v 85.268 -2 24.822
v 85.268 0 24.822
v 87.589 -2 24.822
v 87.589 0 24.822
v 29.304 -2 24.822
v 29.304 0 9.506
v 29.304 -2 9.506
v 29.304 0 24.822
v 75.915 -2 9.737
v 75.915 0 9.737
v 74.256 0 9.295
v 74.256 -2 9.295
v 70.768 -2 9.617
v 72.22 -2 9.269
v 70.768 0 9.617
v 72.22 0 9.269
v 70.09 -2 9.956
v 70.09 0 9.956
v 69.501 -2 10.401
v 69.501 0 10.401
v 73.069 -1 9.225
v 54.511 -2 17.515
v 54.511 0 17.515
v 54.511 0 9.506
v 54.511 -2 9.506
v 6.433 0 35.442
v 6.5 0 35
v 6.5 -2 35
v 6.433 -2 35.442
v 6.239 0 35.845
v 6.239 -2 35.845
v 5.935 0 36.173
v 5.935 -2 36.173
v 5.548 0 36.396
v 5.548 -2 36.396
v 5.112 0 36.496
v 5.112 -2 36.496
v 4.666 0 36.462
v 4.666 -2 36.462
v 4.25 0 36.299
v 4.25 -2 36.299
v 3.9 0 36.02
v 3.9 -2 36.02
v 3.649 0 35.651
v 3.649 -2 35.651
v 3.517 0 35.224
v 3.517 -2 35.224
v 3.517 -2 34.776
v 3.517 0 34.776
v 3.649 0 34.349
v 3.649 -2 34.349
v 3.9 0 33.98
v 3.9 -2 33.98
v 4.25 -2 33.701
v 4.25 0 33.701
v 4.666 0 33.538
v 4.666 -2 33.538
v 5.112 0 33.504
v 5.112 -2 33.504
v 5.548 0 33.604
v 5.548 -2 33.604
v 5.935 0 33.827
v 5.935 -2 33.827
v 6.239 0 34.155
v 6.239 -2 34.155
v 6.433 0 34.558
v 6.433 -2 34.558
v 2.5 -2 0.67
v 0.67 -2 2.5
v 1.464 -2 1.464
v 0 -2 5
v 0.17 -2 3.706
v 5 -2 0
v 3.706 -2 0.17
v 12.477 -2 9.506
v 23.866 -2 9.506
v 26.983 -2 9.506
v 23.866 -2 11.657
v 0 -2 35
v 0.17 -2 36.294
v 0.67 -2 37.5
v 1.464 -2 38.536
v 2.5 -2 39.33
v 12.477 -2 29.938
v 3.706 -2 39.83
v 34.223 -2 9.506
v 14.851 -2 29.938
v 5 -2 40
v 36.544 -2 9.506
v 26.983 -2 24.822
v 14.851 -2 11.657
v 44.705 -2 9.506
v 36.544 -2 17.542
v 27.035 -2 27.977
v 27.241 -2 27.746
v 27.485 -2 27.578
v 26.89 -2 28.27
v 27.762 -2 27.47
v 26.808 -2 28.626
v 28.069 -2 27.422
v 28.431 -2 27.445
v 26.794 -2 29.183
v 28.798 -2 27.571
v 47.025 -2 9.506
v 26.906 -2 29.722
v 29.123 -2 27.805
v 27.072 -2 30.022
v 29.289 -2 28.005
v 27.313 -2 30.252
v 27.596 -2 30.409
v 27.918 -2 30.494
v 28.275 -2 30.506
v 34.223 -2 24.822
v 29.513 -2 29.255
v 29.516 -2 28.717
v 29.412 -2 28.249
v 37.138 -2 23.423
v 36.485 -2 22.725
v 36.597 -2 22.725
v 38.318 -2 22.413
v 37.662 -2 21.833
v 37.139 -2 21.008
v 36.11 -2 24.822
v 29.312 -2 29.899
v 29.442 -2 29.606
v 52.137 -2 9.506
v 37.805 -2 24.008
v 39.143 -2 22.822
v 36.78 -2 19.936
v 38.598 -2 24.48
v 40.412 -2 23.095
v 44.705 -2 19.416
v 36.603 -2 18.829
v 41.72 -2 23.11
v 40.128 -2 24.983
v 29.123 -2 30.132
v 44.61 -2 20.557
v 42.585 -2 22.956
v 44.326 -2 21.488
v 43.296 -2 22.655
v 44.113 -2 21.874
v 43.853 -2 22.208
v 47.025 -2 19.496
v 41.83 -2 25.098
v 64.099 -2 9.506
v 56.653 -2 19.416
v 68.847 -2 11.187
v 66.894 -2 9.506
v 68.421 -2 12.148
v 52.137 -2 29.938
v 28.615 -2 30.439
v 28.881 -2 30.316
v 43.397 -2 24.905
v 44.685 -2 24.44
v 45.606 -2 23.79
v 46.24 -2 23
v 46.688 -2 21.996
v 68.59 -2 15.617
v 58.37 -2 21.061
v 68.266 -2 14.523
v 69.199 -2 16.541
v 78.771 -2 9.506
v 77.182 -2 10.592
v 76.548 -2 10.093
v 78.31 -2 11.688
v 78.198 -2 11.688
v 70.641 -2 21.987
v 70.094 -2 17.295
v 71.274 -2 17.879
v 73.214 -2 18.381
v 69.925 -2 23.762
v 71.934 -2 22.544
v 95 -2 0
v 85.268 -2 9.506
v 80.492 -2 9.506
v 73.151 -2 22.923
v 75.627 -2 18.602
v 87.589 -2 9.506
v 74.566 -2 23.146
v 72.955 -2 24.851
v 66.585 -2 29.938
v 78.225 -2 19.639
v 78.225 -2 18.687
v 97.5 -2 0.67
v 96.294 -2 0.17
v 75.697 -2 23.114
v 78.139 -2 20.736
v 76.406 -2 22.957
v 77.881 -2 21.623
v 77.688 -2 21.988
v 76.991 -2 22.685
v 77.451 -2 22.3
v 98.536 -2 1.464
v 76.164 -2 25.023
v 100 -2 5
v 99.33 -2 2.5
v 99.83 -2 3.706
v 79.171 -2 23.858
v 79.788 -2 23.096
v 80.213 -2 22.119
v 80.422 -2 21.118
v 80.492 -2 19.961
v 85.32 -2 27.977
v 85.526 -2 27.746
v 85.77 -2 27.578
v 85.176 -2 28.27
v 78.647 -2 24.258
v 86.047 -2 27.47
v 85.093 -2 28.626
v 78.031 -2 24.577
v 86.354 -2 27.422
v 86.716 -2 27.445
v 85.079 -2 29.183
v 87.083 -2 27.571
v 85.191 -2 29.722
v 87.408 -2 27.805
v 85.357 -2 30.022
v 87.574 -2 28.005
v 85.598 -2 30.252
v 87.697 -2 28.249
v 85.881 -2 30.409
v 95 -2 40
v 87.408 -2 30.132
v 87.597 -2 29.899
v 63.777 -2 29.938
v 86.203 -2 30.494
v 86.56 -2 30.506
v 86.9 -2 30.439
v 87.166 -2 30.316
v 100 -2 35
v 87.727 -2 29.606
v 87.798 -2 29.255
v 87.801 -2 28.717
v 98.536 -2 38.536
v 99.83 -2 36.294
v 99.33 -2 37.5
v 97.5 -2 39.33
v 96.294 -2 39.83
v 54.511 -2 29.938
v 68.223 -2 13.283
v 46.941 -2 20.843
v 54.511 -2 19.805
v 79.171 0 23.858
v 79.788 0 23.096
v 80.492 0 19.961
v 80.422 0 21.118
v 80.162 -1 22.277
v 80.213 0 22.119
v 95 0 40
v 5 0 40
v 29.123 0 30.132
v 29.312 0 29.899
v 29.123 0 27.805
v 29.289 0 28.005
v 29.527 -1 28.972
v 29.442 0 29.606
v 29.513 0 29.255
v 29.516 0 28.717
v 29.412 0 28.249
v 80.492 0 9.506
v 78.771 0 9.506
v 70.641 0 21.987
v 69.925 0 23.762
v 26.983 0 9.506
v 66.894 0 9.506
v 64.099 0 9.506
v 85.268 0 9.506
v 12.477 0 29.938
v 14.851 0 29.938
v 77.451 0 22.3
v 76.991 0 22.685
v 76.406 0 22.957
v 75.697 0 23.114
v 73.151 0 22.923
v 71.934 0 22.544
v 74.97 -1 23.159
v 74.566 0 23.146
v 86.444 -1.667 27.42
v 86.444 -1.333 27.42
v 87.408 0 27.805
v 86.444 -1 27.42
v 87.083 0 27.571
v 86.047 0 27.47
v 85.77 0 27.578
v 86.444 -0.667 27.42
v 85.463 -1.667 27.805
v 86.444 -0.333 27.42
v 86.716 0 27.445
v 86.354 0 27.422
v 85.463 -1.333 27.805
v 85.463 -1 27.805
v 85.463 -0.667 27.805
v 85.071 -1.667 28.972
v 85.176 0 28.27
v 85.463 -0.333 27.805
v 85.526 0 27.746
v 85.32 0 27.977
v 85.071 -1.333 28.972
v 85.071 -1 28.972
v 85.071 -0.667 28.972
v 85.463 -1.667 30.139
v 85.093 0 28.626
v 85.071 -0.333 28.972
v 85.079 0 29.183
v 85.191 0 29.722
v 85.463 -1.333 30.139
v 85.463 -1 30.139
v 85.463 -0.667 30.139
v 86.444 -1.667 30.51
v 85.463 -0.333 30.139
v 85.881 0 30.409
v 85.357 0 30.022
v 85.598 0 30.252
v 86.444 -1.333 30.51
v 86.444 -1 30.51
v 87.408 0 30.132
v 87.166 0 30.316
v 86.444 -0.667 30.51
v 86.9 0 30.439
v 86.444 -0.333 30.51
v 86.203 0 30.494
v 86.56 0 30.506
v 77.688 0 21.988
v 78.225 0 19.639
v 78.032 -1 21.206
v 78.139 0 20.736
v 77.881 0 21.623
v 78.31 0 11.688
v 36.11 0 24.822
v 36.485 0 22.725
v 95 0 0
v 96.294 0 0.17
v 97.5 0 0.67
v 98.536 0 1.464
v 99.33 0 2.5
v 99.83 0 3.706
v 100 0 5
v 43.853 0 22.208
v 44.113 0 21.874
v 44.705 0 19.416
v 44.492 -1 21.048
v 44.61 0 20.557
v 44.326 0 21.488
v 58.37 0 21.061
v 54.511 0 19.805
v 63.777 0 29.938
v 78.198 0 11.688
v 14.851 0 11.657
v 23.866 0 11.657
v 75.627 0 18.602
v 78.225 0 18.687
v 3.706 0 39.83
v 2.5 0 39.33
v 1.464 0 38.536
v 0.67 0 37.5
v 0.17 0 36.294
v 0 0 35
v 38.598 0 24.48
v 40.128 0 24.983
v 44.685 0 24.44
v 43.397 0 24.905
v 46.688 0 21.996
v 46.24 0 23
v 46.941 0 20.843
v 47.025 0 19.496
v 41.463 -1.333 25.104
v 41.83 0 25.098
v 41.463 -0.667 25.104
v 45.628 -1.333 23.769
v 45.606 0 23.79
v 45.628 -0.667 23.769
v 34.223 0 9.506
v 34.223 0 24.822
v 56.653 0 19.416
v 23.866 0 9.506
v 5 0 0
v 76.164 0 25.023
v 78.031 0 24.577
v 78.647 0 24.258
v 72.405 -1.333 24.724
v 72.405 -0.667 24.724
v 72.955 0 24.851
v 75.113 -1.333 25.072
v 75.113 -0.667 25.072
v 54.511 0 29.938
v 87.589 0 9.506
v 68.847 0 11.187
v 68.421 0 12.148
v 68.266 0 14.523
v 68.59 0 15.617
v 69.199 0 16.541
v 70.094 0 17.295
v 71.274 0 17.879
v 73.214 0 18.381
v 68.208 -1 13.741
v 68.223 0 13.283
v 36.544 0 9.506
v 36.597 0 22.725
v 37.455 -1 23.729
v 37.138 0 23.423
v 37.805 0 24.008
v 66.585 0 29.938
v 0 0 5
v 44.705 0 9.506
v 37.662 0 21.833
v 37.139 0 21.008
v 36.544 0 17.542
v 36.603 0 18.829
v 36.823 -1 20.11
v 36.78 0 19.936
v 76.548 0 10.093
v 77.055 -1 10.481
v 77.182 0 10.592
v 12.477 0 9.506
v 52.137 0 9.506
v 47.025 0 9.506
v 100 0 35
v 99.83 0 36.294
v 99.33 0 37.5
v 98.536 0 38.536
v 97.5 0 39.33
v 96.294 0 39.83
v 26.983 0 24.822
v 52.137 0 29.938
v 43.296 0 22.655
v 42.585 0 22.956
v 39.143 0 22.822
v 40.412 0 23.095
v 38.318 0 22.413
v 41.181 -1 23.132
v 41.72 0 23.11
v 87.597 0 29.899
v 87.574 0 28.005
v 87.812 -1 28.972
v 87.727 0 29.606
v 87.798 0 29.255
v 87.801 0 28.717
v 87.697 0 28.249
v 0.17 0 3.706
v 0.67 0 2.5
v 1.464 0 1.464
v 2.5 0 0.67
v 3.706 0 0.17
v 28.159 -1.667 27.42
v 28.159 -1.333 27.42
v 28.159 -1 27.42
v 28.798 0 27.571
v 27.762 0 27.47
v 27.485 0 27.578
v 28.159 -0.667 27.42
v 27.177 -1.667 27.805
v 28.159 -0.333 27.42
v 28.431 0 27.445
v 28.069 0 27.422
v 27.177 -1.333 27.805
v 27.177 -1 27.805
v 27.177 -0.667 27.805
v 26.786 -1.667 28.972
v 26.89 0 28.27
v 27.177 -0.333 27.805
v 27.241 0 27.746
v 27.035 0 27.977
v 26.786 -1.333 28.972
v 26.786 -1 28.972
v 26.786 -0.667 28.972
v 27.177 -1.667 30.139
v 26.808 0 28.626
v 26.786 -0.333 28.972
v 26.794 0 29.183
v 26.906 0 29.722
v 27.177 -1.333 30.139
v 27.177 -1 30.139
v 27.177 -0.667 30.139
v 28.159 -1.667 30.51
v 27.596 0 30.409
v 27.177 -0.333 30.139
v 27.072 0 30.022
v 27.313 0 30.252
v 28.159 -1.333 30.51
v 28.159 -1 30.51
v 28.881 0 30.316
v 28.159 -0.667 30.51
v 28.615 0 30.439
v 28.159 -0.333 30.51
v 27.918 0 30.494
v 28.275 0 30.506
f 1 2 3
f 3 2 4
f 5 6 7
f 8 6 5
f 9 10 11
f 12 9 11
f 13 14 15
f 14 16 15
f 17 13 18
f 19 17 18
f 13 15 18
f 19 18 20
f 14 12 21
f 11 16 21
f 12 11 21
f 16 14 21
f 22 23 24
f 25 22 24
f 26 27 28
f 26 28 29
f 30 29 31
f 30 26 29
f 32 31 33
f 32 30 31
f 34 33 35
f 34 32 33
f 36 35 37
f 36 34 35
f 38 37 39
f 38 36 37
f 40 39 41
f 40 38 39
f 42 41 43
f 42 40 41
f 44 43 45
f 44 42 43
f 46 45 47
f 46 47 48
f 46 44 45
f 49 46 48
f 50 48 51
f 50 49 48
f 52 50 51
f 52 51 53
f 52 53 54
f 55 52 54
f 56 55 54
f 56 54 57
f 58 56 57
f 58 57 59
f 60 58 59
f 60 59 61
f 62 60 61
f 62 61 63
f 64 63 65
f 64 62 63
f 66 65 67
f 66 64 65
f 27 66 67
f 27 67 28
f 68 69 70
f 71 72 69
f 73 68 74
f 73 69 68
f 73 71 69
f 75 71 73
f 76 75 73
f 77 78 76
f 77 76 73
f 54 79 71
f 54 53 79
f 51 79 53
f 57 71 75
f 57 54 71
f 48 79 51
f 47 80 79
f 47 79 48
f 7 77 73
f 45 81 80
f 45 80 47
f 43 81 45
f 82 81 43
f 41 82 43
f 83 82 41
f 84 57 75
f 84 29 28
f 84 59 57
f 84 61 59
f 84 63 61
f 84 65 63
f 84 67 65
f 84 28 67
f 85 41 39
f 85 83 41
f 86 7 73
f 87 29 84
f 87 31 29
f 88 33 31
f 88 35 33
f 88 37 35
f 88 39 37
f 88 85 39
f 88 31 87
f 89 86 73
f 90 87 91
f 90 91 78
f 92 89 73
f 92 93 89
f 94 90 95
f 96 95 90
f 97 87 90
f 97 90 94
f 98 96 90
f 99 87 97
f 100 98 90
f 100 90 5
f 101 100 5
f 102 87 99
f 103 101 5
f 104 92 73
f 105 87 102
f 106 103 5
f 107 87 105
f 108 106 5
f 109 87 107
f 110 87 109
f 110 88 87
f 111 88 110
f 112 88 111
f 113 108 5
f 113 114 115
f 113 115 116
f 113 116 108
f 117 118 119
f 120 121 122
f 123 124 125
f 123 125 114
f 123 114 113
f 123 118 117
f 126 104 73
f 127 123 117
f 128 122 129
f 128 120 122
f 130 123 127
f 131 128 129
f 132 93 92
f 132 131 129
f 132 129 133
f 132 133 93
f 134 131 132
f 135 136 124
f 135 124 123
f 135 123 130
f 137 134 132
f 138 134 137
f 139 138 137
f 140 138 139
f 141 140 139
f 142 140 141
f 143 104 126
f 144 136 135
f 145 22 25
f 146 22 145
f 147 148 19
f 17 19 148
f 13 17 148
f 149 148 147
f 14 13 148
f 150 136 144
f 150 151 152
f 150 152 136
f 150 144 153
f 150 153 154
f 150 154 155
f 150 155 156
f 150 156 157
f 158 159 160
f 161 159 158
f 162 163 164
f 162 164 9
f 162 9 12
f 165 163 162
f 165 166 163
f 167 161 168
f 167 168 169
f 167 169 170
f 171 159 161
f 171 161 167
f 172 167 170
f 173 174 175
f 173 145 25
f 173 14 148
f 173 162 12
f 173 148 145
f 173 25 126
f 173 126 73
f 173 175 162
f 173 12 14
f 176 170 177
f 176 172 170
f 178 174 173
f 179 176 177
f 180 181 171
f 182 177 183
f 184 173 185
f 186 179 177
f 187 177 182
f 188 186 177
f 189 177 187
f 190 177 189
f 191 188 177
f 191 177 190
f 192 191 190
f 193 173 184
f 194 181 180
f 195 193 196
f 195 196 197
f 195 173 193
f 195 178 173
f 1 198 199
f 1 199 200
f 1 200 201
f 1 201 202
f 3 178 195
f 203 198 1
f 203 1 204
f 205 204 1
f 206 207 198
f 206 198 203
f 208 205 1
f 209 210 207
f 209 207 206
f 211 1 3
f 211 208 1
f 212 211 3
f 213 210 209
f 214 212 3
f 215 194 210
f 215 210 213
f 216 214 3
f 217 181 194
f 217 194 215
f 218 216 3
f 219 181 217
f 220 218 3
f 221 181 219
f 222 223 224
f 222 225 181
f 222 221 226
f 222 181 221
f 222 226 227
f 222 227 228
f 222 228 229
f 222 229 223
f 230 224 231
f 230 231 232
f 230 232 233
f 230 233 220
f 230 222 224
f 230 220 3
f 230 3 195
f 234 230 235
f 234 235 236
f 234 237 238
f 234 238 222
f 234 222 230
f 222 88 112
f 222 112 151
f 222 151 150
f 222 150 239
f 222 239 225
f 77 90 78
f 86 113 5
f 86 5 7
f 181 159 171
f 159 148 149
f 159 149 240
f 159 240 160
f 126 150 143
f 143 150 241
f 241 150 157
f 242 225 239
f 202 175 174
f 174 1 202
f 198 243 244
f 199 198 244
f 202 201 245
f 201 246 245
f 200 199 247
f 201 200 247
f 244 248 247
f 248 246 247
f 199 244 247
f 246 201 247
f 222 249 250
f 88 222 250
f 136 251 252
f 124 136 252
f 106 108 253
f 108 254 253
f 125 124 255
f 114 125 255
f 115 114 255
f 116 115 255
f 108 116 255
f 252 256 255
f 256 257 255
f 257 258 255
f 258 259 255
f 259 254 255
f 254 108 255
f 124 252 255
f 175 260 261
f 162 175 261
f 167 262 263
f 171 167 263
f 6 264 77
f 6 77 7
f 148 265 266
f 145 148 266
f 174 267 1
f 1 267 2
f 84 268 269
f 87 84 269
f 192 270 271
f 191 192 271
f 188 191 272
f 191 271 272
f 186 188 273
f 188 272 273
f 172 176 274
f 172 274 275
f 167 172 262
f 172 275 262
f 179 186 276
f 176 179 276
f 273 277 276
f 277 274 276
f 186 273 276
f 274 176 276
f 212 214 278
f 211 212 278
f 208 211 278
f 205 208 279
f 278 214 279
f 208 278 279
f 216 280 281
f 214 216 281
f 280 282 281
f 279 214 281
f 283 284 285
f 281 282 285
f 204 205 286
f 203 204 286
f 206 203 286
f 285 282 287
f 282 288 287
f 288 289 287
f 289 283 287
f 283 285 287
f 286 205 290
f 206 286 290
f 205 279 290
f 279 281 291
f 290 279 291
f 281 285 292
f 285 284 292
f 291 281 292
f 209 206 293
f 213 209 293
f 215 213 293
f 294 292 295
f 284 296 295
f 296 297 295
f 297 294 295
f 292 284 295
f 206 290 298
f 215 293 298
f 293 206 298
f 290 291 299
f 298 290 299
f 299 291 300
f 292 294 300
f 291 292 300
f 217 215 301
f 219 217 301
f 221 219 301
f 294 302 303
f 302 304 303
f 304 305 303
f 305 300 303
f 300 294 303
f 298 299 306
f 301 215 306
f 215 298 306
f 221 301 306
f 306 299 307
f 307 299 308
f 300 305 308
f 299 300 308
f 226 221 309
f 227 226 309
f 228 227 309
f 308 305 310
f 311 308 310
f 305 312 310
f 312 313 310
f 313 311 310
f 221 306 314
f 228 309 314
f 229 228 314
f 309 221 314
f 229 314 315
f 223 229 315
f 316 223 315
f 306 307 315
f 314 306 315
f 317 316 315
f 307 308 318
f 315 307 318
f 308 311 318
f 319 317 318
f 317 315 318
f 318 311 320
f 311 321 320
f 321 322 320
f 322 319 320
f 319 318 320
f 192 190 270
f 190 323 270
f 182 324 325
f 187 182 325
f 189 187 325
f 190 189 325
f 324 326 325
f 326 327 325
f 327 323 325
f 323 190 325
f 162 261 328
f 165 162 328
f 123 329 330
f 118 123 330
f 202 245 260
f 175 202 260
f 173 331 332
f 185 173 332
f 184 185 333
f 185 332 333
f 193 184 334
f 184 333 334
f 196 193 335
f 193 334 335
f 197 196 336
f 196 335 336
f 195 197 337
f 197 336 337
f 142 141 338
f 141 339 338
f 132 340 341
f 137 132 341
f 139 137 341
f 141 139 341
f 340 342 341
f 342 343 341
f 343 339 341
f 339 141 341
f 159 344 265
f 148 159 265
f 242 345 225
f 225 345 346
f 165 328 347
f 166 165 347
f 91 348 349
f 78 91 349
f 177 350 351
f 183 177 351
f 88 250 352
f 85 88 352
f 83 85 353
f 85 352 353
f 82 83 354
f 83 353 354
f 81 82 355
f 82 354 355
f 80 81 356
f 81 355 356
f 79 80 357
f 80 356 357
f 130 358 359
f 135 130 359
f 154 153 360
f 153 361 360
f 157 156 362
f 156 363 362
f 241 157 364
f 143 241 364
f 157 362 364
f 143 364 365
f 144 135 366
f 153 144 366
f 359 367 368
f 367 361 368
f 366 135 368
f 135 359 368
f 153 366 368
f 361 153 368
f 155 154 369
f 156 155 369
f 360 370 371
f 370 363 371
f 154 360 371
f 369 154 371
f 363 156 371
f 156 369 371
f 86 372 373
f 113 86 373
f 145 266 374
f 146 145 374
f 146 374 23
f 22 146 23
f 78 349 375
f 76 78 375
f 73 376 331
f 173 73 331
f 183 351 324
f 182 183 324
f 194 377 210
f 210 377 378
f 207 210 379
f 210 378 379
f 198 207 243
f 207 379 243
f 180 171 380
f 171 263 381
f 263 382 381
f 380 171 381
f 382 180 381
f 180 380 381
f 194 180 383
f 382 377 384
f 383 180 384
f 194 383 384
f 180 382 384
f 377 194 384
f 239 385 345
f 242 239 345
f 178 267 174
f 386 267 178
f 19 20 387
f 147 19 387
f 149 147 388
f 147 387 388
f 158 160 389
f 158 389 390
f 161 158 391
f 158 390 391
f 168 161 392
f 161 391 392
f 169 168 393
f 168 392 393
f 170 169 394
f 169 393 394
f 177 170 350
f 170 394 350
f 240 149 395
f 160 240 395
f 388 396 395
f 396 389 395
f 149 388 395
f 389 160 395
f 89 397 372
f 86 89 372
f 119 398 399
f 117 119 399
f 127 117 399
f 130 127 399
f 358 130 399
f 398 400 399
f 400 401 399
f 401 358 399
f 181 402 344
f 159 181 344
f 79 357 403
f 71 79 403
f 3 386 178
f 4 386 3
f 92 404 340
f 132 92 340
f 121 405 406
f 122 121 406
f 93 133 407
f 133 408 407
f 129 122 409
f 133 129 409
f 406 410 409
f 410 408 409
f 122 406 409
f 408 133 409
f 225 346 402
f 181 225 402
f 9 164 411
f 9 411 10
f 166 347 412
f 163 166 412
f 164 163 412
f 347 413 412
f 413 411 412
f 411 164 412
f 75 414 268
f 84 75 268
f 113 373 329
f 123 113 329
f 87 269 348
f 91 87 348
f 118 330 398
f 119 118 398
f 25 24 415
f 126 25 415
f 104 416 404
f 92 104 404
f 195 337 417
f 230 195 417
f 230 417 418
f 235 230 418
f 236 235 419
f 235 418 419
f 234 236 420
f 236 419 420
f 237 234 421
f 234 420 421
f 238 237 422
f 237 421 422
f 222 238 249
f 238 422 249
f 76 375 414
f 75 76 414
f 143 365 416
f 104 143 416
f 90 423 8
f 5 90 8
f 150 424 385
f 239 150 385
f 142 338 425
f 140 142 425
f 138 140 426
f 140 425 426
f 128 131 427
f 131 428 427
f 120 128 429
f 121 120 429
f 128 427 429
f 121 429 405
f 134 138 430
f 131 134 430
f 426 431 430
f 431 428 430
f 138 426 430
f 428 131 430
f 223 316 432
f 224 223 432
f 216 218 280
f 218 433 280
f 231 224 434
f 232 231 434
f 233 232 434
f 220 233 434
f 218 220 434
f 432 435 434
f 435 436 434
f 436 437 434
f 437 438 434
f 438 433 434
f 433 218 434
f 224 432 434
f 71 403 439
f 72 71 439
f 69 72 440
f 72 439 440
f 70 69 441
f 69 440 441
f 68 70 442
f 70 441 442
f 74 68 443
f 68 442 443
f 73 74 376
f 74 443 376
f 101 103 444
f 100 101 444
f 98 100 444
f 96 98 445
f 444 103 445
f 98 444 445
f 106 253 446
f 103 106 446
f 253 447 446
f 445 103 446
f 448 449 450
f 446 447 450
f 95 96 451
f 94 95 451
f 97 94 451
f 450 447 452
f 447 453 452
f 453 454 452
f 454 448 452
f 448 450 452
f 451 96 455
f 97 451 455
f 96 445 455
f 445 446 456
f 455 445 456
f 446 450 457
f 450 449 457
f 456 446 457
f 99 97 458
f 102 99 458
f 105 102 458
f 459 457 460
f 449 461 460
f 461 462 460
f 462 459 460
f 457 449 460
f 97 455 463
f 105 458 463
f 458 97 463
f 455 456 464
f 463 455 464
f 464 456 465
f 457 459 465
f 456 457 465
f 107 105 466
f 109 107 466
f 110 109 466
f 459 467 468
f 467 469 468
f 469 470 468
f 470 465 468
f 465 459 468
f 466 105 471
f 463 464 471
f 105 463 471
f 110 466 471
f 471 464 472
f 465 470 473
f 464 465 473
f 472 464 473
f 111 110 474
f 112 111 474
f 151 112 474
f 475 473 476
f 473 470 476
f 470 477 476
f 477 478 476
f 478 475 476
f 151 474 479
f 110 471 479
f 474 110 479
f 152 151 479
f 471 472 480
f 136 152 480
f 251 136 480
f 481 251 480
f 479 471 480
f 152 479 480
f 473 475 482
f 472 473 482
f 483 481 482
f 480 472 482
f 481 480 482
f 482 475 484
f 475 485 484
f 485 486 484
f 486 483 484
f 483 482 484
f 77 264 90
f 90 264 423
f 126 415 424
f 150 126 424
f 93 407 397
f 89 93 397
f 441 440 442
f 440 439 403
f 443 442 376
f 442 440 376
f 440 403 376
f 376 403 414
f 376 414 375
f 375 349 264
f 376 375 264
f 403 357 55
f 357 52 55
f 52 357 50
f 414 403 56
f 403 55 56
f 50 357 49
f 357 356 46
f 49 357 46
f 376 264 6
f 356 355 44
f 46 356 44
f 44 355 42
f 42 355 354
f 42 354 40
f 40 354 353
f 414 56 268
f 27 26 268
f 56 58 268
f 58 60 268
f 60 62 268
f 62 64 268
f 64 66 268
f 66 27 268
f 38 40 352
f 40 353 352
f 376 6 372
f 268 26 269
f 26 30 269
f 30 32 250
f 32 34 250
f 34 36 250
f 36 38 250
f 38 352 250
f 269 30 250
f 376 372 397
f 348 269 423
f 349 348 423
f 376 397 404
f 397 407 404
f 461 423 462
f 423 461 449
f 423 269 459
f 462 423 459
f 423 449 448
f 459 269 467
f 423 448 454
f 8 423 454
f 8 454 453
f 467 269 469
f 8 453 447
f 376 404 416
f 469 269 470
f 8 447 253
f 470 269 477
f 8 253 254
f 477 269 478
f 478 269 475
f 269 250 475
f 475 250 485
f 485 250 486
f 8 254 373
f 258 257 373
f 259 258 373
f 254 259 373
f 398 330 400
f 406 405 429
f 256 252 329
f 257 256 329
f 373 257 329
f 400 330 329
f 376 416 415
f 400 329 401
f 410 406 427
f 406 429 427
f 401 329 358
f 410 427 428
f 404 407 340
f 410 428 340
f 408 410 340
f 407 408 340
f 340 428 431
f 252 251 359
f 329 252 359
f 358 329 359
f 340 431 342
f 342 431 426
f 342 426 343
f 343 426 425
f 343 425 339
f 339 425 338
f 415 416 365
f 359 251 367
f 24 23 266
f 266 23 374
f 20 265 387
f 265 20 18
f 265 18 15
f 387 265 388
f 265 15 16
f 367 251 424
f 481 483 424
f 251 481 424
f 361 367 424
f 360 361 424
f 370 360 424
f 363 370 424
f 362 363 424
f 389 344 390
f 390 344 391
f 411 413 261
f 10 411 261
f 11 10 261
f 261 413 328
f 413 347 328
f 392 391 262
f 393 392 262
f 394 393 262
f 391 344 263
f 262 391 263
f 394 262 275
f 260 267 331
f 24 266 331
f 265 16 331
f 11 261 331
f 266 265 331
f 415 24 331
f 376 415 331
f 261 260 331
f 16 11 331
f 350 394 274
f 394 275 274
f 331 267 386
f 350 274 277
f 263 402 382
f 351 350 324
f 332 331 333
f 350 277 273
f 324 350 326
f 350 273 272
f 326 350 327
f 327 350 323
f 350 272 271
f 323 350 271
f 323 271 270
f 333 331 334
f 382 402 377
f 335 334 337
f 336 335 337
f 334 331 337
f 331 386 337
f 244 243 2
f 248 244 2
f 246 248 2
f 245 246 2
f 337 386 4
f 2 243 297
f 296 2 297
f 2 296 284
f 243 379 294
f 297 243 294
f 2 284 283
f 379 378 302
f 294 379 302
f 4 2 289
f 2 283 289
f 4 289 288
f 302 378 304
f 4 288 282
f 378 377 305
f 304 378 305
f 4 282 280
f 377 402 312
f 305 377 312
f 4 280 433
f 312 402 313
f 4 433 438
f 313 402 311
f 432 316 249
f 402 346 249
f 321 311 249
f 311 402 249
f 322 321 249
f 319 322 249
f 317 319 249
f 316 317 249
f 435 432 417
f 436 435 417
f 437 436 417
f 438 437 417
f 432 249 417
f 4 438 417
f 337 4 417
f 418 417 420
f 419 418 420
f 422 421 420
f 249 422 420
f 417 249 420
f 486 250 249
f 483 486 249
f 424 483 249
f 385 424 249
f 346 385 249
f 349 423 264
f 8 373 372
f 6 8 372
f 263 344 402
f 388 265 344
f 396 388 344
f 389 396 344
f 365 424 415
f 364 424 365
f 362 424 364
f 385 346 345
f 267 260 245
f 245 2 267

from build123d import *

# Parameters (mm, degrees)
F0_W     = 2.3208496367
F0_H     = 15.3158188932
F0_R     = 1.5
F1_DEPTH = 2


with BuildPart() as f1:
    # F0 (on Front) → F1 (new body)
    with BuildSketch(Plane.XZ):
        with BuildLine():
            ThreePointArc((0, 5), (1.4644660941, 1.4644660941), (5, 0))
            Line((5, 0), (95, 0))
            ThreePointArc((95, 0), (98.5355339059, 1.4644660941), (100, 5))
            Line((100, 5), (100, 35))
            ThreePointArc((100, 35), (98.5355339059, 38.5355339059), (95, 40))
            Line((95, 40), (5, 40))
            ThreePointArc((5, 40), (1.4644660941, 38.5355339059), (0, 35))
            Line((0, 35), (0, 5))
        make_face()
        Polygon((23.8661115754, 9.5062389972), (12.4765084451, 9.5062389972), (12.4765084451, 29.9377649894), (14.8510193451, 29.9377649894), (14.8510193451, 11.6571613002), (23.8661115754, 11.6571613002), align=None, mode=Mode.SUBTRACT)
        with Locations((28.1433614356, 17.1641484438)):
            Rectangle(F0_W, F0_H, mode=Mode.SUBTRACT)
        with BuildLine():
            Line((47.0254184507, 9.5062389972), (44.7045688141, 9.5062389972))
            Line((44.7045688141, 9.5062389972), (44.7045688141, 19.4156856154))
            add(Edge.make_bspline(
                [(44.7045688141, 19.4156856154), (44.7045688141, 21.2848862862), (43.8526962596, 22.2083071917)],
                knots=[0, 0, 0, 1, 1, 1], degree=2))
            add(Edge.make_bspline(
                [(43.8526962596, 22.2083071917), (43.0008237051, 23.1317280973), (41.1808125256, 23.1317280973)],
                knots=[0, 0, 0, 1, 1, 1], degree=2))
            add(Edge.make_bspline(
                [(41.1808125256, 23.1317280973), (38.779470994, 23.1317280973), (37.6615280091, 21.8326783488)],
                knots=[0, 0, 0, 1, 1, 1], degree=2))
            add(Edge.make_bspline(
                [(37.6615280091, 21.8326783488), (36.5435850242, 20.5336286004), (36.5435850242, 17.5420131727)],
                knots=[0, 0, 0, 1, 1, 1], degree=2))
            Line((36.5435850242, 17.5420131727), (36.5435850242, 9.5062389972))
            Line((36.5435850242, 9.5062389972), (34.2227353876, 9.5062389972))
            Line((34.2227353876, 9.5062389972), (34.2227353876, 24.8220578905))
            Line((34.2227353876, 24.8220578905), (36.1098231461, 24.8220578905))
            Line((36.1098231461, 24.8220578905), (36.485451989, 22.7247968508))
            Line((36.485451989, 22.7247968508), (36.5972462875, 22.7247968508))
            add(Edge.make_bspline(
                [(36.5972462875, 22.7247968508), (37.3127297978, 23.8561551515), (38.5983642305, 24.4799673371)],
                knots=[0, 0, 0, 1, 1, 1], degree=2))
            add(Edge.make_bspline(
                [(38.5983642305, 24.4799673371), (39.8839986631, 25.1037795227), (41.4625341578, 25.1037795227)],
                knots=[0, 0, 0, 1, 1, 1], degree=2))
            add(Edge.make_bspline(
                [(41.4625341578, 25.1037795227), (44.2305609885, 25.1037795227), (45.6279897196, 23.7689555987)],
                knots=[0, 0, 0, 1, 1, 1], degree=2))
            add(Edge.make_bspline(
                [(45.6279897196, 23.7689555987), (47.0254184507, 22.4341316747), (47.0254184507, 19.4961775104)],
                knots=[0, 0, 0, 1, 1, 1], degree=2))
            Line((47.0254184507, 19.4961775104), (47.0254184507, 9.5062389972))
        make_face(mode=Mode.SUBTRACT)
        Polygon((58.3703038616, 21.0612976892), (66.8935011785, 9.5062389972), (64.0986437162, 9.5062389972), (56.6531434368, 19.4156856154), (54.5111646777, 17.5151825411), (54.5111646777, 9.5062389972), (52.1366537777, 9.5062389972), (52.1366537777, 29.9377649894), (54.5111646777, 29.9377649894), (54.5111646777, 19.8047297742), (63.7766761366, 29.9377649894), (66.5849489147, 29.9377649894), align=None, mode=Mode.SUBTRACT)
        with BuildLine():
            Line((80.4921596469, 9.5062389972), (78.7705274502, 9.5062389972))
            Line((78.7705274502, 9.5062389972), (78.3099349404, 11.6884637038))
            Line((78.3099349404, 11.6884637038), (78.1981406419, 11.6884637038))
            add(Edge.make_bspline(
                [(78.1981406419, 11.6884637038), (77.0533670254, 10.2485531392), (75.9153010667, 9.7365352521)],
                knots=[0, 0, 0, 1, 1, 1], degree=2))
            add(Edge.make_bspline(
                [(75.9153010667, 9.7365352521), (74.7772351081, 9.224517365), (73.0690182271, 9.224517365)],
                knots=[0, 0, 0, 1, 1, 1], degree=2))
            add(Edge.make_bspline(
                [(73.0690182271, 9.224517365), (70.7928863099, 9.224517365), (69.5005442193, 10.4005933852)],
                knots=[0, 0, 0, 1, 1, 1], degree=2))
            add(Edge.make_bspline(
                [(69.5005442193, 10.4005933852), (68.2082021288, 11.5766694053), (68.2082021288, 13.7410070241)],
                knots=[0, 0, 0, 1, 1, 1], degree=2))
            add(Edge.make_bspline(
                [(68.2082021288, 13.7410070241), (68.2082021288, 18.3782345255), (75.6268717766, 18.6018231224)],
                knots=[0, 0, 0, 1, 1, 1], degree=2))
            Line((75.6268717766, 18.6018231224), (78.2249712735, 18.6867867893))
            Line((78.2249712735, 18.6867867893), (78.2249712735, 19.6392742124))
            add(Edge.make_bspline(
                [(78.2249712735, 19.6392742124), (78.2249712735, 21.4413983041), (77.451354728, 22.2999785165)],
                knots=[0, 0, 0, 1, 1, 1], degree=2))
            add(Edge.make_bspline(
                [(77.451354728, 22.2999785165), (76.6777381824, 23.1585587289), (74.9695213015, 23.1585587289)],
                knots=[0, 0, 0, 1, 1, 1], degree=2))
            add(Edge.make_bspline(
                [(74.9695213015, 23.1585587289), (73.0556029113, 23.1585587289), (70.6408460639, 21.9869544807)],
                knots=[0, 0, 0, 1, 1, 1], degree=2))
            Line((70.6408460639, 21.9869544807), (69.9253625536, 23.7622479408))
            add(Edge.make_bspline(
                [(69.9253625536, 23.7622479408), (71.0567208543, 24.3748806965), (72.4049600941, 24.7236789078)],
                knots=[0, 0, 0, 1, 1, 1], degree=2))
            add(Edge.make_bspline(
                [(72.4049600941, 24.7236789078), (73.7531993339, 25.0724771191), (75.1126180036, 25.0724771191)],
                knots=[0, 0, 0, 1, 1, 1], degree=2))
            add(Edge.make_bspline(
                [(75.1126180036, 25.0724771191), (77.8493424306, 25.0724771191), (79.1707510388, 23.8583910375)],
                knots=[0, 0, 0, 1, 1, 1], degree=2))
            add(Edge.make_bspline(
                [(79.1707510388, 23.8583910375), (80.4921596469, 22.6443049559), (80.4921596469, 19.9612417921)],
                knots=[0, 0, 0, 1, 1, 1], degree=2))
            Line((80.4921596469, 19.9612417921), (80.4921596469, 9.5062389972))
        make_face(mode=Mode.SUBTRACT)
        with Locations((86.4284368968, 17.1641484438)):
            Rectangle(F0_W, F0_H, mode=Mode.SUBTRACT)
        with BuildLine():
            add(Edge.make_bspline(
                [(27.1774586967, 27.8047297742), (26.786178652, 28.189302161), (26.786178652, 28.9718622504)],
                knots=[0, 0, 0, 1, 1, 1], degree=2))
            add(Edge.make_bspline(
                [(26.786178652, 28.9718622504), (26.786178652, 29.7678376557), (27.1774586967, 30.1389947267)],
                knots=[0, 0, 0, 1, 1, 1], degree=2))
            add(Edge.make_bspline(
                [(27.1774586967, 30.1389947267), (27.5687387414, 30.5101517977), (28.1590126374, 30.5101517977)],
                knots=[0, 0, 0, 1, 1, 1], degree=2))
            add(Edge.make_bspline(
                [(28.1590126374, 30.5101517977), (28.7179841299, 30.5101517977), (29.1226794904, 30.1322870688)],
                knots=[0, 0, 0, 1, 1, 1], degree=2))
            add(Edge.make_bspline(
                [(29.1226794904, 30.1322870688), (29.527374851, 29.7544223399), (29.527374851, 28.9718622504)],
                knots=[0, 0, 0, 1, 1, 1], degree=2))
            add(Edge.make_bspline(
                [(29.527374851, 28.9718622504), (29.527374851, 28.189302161), (29.1226794904, 27.8047297742)],
                knots=[0, 0, 0, 1, 1, 1], degree=2))
            add(Edge.make_bspline(
                [(29.1226794904, 27.8047297742), (28.7179841299, 27.4201573874), (28.1590126374, 27.4201573874)],
                knots=[0, 0, 0, 1, 1, 1], degree=2))
            add(Edge.make_bspline(
                [(28.1590126374, 27.4201573874), (27.5687387414, 27.4201573874), (27.1774586967, 27.8047297742)],
                knots=[0, 0, 0, 1, 1, 1], degree=2))
        make_face(mode=Mode.SUBTRACT)
        with Locations((5, 35)):
            Circle(F0_R, mode=Mode.SUBTRACT)
        with BuildLine():
            add(Edge.make_bspline(
                [(85.4625341578, 27.8047297742), (85.0712541131, 28.189302161), (85.0712541131, 28.9718622504)],
                knots=[0, 0, 0, 1, 1, 1], degree=2))
            add(Edge.make_bspline(
                [(85.0712541131, 28.9718622504), (85.0712541131, 29.7678376557), (85.4625341578, 30.1389947267)],
                knots=[0, 0, 0, 1, 1, 1], degree=2))
            add(Edge.make_bspline(
                [(85.4625341578, 30.1389947267), (85.8538142025, 30.5101517977), (86.4440880986, 30.5101517977)],
                knots=[0, 0, 0, 1, 1, 1], degree=2))
            add(Edge.make_bspline(
                [(86.4440880986, 30.5101517977), (87.003059591, 30.5101517977), (87.4077549516, 30.1322870688)],
                knots=[0, 0, 0, 1, 1, 1], degree=2))
            add(Edge.make_bspline(
                [(87.4077549516, 30.1322870688), (87.8124503121, 29.7544223399), (87.8124503121, 28.9718622504)],
                knots=[0, 0, 0, 1, 1, 1], degree=2))
            add(Edge.make_bspline(
                [(87.8124503121, 28.9718622504), (87.8124503121, 28.189302161), (87.4077549516, 27.8047297742)],
                knots=[0, 0, 0, 1, 1, 1], degree=2))
            add(Edge.make_bspline(
                [(87.4077549516, 27.8047297742), (87.003059591, 27.4201573874), (86.4440880986, 27.4201573874)],
                knots=[0, 0, 0, 1, 1, 1], degree=2))
            add(Edge.make_bspline(
                [(86.4440880986, 27.4201573874), (85.8538142025, 27.4201573874), (85.4625341578, 27.8047297742)],
                knots=[0, 0, 0, 1, 1, 1], degree=2))
        make_face(mode=Mode.SUBTRACT)
    extrude(amount=F1_DEPTH)


solid = f1.part
